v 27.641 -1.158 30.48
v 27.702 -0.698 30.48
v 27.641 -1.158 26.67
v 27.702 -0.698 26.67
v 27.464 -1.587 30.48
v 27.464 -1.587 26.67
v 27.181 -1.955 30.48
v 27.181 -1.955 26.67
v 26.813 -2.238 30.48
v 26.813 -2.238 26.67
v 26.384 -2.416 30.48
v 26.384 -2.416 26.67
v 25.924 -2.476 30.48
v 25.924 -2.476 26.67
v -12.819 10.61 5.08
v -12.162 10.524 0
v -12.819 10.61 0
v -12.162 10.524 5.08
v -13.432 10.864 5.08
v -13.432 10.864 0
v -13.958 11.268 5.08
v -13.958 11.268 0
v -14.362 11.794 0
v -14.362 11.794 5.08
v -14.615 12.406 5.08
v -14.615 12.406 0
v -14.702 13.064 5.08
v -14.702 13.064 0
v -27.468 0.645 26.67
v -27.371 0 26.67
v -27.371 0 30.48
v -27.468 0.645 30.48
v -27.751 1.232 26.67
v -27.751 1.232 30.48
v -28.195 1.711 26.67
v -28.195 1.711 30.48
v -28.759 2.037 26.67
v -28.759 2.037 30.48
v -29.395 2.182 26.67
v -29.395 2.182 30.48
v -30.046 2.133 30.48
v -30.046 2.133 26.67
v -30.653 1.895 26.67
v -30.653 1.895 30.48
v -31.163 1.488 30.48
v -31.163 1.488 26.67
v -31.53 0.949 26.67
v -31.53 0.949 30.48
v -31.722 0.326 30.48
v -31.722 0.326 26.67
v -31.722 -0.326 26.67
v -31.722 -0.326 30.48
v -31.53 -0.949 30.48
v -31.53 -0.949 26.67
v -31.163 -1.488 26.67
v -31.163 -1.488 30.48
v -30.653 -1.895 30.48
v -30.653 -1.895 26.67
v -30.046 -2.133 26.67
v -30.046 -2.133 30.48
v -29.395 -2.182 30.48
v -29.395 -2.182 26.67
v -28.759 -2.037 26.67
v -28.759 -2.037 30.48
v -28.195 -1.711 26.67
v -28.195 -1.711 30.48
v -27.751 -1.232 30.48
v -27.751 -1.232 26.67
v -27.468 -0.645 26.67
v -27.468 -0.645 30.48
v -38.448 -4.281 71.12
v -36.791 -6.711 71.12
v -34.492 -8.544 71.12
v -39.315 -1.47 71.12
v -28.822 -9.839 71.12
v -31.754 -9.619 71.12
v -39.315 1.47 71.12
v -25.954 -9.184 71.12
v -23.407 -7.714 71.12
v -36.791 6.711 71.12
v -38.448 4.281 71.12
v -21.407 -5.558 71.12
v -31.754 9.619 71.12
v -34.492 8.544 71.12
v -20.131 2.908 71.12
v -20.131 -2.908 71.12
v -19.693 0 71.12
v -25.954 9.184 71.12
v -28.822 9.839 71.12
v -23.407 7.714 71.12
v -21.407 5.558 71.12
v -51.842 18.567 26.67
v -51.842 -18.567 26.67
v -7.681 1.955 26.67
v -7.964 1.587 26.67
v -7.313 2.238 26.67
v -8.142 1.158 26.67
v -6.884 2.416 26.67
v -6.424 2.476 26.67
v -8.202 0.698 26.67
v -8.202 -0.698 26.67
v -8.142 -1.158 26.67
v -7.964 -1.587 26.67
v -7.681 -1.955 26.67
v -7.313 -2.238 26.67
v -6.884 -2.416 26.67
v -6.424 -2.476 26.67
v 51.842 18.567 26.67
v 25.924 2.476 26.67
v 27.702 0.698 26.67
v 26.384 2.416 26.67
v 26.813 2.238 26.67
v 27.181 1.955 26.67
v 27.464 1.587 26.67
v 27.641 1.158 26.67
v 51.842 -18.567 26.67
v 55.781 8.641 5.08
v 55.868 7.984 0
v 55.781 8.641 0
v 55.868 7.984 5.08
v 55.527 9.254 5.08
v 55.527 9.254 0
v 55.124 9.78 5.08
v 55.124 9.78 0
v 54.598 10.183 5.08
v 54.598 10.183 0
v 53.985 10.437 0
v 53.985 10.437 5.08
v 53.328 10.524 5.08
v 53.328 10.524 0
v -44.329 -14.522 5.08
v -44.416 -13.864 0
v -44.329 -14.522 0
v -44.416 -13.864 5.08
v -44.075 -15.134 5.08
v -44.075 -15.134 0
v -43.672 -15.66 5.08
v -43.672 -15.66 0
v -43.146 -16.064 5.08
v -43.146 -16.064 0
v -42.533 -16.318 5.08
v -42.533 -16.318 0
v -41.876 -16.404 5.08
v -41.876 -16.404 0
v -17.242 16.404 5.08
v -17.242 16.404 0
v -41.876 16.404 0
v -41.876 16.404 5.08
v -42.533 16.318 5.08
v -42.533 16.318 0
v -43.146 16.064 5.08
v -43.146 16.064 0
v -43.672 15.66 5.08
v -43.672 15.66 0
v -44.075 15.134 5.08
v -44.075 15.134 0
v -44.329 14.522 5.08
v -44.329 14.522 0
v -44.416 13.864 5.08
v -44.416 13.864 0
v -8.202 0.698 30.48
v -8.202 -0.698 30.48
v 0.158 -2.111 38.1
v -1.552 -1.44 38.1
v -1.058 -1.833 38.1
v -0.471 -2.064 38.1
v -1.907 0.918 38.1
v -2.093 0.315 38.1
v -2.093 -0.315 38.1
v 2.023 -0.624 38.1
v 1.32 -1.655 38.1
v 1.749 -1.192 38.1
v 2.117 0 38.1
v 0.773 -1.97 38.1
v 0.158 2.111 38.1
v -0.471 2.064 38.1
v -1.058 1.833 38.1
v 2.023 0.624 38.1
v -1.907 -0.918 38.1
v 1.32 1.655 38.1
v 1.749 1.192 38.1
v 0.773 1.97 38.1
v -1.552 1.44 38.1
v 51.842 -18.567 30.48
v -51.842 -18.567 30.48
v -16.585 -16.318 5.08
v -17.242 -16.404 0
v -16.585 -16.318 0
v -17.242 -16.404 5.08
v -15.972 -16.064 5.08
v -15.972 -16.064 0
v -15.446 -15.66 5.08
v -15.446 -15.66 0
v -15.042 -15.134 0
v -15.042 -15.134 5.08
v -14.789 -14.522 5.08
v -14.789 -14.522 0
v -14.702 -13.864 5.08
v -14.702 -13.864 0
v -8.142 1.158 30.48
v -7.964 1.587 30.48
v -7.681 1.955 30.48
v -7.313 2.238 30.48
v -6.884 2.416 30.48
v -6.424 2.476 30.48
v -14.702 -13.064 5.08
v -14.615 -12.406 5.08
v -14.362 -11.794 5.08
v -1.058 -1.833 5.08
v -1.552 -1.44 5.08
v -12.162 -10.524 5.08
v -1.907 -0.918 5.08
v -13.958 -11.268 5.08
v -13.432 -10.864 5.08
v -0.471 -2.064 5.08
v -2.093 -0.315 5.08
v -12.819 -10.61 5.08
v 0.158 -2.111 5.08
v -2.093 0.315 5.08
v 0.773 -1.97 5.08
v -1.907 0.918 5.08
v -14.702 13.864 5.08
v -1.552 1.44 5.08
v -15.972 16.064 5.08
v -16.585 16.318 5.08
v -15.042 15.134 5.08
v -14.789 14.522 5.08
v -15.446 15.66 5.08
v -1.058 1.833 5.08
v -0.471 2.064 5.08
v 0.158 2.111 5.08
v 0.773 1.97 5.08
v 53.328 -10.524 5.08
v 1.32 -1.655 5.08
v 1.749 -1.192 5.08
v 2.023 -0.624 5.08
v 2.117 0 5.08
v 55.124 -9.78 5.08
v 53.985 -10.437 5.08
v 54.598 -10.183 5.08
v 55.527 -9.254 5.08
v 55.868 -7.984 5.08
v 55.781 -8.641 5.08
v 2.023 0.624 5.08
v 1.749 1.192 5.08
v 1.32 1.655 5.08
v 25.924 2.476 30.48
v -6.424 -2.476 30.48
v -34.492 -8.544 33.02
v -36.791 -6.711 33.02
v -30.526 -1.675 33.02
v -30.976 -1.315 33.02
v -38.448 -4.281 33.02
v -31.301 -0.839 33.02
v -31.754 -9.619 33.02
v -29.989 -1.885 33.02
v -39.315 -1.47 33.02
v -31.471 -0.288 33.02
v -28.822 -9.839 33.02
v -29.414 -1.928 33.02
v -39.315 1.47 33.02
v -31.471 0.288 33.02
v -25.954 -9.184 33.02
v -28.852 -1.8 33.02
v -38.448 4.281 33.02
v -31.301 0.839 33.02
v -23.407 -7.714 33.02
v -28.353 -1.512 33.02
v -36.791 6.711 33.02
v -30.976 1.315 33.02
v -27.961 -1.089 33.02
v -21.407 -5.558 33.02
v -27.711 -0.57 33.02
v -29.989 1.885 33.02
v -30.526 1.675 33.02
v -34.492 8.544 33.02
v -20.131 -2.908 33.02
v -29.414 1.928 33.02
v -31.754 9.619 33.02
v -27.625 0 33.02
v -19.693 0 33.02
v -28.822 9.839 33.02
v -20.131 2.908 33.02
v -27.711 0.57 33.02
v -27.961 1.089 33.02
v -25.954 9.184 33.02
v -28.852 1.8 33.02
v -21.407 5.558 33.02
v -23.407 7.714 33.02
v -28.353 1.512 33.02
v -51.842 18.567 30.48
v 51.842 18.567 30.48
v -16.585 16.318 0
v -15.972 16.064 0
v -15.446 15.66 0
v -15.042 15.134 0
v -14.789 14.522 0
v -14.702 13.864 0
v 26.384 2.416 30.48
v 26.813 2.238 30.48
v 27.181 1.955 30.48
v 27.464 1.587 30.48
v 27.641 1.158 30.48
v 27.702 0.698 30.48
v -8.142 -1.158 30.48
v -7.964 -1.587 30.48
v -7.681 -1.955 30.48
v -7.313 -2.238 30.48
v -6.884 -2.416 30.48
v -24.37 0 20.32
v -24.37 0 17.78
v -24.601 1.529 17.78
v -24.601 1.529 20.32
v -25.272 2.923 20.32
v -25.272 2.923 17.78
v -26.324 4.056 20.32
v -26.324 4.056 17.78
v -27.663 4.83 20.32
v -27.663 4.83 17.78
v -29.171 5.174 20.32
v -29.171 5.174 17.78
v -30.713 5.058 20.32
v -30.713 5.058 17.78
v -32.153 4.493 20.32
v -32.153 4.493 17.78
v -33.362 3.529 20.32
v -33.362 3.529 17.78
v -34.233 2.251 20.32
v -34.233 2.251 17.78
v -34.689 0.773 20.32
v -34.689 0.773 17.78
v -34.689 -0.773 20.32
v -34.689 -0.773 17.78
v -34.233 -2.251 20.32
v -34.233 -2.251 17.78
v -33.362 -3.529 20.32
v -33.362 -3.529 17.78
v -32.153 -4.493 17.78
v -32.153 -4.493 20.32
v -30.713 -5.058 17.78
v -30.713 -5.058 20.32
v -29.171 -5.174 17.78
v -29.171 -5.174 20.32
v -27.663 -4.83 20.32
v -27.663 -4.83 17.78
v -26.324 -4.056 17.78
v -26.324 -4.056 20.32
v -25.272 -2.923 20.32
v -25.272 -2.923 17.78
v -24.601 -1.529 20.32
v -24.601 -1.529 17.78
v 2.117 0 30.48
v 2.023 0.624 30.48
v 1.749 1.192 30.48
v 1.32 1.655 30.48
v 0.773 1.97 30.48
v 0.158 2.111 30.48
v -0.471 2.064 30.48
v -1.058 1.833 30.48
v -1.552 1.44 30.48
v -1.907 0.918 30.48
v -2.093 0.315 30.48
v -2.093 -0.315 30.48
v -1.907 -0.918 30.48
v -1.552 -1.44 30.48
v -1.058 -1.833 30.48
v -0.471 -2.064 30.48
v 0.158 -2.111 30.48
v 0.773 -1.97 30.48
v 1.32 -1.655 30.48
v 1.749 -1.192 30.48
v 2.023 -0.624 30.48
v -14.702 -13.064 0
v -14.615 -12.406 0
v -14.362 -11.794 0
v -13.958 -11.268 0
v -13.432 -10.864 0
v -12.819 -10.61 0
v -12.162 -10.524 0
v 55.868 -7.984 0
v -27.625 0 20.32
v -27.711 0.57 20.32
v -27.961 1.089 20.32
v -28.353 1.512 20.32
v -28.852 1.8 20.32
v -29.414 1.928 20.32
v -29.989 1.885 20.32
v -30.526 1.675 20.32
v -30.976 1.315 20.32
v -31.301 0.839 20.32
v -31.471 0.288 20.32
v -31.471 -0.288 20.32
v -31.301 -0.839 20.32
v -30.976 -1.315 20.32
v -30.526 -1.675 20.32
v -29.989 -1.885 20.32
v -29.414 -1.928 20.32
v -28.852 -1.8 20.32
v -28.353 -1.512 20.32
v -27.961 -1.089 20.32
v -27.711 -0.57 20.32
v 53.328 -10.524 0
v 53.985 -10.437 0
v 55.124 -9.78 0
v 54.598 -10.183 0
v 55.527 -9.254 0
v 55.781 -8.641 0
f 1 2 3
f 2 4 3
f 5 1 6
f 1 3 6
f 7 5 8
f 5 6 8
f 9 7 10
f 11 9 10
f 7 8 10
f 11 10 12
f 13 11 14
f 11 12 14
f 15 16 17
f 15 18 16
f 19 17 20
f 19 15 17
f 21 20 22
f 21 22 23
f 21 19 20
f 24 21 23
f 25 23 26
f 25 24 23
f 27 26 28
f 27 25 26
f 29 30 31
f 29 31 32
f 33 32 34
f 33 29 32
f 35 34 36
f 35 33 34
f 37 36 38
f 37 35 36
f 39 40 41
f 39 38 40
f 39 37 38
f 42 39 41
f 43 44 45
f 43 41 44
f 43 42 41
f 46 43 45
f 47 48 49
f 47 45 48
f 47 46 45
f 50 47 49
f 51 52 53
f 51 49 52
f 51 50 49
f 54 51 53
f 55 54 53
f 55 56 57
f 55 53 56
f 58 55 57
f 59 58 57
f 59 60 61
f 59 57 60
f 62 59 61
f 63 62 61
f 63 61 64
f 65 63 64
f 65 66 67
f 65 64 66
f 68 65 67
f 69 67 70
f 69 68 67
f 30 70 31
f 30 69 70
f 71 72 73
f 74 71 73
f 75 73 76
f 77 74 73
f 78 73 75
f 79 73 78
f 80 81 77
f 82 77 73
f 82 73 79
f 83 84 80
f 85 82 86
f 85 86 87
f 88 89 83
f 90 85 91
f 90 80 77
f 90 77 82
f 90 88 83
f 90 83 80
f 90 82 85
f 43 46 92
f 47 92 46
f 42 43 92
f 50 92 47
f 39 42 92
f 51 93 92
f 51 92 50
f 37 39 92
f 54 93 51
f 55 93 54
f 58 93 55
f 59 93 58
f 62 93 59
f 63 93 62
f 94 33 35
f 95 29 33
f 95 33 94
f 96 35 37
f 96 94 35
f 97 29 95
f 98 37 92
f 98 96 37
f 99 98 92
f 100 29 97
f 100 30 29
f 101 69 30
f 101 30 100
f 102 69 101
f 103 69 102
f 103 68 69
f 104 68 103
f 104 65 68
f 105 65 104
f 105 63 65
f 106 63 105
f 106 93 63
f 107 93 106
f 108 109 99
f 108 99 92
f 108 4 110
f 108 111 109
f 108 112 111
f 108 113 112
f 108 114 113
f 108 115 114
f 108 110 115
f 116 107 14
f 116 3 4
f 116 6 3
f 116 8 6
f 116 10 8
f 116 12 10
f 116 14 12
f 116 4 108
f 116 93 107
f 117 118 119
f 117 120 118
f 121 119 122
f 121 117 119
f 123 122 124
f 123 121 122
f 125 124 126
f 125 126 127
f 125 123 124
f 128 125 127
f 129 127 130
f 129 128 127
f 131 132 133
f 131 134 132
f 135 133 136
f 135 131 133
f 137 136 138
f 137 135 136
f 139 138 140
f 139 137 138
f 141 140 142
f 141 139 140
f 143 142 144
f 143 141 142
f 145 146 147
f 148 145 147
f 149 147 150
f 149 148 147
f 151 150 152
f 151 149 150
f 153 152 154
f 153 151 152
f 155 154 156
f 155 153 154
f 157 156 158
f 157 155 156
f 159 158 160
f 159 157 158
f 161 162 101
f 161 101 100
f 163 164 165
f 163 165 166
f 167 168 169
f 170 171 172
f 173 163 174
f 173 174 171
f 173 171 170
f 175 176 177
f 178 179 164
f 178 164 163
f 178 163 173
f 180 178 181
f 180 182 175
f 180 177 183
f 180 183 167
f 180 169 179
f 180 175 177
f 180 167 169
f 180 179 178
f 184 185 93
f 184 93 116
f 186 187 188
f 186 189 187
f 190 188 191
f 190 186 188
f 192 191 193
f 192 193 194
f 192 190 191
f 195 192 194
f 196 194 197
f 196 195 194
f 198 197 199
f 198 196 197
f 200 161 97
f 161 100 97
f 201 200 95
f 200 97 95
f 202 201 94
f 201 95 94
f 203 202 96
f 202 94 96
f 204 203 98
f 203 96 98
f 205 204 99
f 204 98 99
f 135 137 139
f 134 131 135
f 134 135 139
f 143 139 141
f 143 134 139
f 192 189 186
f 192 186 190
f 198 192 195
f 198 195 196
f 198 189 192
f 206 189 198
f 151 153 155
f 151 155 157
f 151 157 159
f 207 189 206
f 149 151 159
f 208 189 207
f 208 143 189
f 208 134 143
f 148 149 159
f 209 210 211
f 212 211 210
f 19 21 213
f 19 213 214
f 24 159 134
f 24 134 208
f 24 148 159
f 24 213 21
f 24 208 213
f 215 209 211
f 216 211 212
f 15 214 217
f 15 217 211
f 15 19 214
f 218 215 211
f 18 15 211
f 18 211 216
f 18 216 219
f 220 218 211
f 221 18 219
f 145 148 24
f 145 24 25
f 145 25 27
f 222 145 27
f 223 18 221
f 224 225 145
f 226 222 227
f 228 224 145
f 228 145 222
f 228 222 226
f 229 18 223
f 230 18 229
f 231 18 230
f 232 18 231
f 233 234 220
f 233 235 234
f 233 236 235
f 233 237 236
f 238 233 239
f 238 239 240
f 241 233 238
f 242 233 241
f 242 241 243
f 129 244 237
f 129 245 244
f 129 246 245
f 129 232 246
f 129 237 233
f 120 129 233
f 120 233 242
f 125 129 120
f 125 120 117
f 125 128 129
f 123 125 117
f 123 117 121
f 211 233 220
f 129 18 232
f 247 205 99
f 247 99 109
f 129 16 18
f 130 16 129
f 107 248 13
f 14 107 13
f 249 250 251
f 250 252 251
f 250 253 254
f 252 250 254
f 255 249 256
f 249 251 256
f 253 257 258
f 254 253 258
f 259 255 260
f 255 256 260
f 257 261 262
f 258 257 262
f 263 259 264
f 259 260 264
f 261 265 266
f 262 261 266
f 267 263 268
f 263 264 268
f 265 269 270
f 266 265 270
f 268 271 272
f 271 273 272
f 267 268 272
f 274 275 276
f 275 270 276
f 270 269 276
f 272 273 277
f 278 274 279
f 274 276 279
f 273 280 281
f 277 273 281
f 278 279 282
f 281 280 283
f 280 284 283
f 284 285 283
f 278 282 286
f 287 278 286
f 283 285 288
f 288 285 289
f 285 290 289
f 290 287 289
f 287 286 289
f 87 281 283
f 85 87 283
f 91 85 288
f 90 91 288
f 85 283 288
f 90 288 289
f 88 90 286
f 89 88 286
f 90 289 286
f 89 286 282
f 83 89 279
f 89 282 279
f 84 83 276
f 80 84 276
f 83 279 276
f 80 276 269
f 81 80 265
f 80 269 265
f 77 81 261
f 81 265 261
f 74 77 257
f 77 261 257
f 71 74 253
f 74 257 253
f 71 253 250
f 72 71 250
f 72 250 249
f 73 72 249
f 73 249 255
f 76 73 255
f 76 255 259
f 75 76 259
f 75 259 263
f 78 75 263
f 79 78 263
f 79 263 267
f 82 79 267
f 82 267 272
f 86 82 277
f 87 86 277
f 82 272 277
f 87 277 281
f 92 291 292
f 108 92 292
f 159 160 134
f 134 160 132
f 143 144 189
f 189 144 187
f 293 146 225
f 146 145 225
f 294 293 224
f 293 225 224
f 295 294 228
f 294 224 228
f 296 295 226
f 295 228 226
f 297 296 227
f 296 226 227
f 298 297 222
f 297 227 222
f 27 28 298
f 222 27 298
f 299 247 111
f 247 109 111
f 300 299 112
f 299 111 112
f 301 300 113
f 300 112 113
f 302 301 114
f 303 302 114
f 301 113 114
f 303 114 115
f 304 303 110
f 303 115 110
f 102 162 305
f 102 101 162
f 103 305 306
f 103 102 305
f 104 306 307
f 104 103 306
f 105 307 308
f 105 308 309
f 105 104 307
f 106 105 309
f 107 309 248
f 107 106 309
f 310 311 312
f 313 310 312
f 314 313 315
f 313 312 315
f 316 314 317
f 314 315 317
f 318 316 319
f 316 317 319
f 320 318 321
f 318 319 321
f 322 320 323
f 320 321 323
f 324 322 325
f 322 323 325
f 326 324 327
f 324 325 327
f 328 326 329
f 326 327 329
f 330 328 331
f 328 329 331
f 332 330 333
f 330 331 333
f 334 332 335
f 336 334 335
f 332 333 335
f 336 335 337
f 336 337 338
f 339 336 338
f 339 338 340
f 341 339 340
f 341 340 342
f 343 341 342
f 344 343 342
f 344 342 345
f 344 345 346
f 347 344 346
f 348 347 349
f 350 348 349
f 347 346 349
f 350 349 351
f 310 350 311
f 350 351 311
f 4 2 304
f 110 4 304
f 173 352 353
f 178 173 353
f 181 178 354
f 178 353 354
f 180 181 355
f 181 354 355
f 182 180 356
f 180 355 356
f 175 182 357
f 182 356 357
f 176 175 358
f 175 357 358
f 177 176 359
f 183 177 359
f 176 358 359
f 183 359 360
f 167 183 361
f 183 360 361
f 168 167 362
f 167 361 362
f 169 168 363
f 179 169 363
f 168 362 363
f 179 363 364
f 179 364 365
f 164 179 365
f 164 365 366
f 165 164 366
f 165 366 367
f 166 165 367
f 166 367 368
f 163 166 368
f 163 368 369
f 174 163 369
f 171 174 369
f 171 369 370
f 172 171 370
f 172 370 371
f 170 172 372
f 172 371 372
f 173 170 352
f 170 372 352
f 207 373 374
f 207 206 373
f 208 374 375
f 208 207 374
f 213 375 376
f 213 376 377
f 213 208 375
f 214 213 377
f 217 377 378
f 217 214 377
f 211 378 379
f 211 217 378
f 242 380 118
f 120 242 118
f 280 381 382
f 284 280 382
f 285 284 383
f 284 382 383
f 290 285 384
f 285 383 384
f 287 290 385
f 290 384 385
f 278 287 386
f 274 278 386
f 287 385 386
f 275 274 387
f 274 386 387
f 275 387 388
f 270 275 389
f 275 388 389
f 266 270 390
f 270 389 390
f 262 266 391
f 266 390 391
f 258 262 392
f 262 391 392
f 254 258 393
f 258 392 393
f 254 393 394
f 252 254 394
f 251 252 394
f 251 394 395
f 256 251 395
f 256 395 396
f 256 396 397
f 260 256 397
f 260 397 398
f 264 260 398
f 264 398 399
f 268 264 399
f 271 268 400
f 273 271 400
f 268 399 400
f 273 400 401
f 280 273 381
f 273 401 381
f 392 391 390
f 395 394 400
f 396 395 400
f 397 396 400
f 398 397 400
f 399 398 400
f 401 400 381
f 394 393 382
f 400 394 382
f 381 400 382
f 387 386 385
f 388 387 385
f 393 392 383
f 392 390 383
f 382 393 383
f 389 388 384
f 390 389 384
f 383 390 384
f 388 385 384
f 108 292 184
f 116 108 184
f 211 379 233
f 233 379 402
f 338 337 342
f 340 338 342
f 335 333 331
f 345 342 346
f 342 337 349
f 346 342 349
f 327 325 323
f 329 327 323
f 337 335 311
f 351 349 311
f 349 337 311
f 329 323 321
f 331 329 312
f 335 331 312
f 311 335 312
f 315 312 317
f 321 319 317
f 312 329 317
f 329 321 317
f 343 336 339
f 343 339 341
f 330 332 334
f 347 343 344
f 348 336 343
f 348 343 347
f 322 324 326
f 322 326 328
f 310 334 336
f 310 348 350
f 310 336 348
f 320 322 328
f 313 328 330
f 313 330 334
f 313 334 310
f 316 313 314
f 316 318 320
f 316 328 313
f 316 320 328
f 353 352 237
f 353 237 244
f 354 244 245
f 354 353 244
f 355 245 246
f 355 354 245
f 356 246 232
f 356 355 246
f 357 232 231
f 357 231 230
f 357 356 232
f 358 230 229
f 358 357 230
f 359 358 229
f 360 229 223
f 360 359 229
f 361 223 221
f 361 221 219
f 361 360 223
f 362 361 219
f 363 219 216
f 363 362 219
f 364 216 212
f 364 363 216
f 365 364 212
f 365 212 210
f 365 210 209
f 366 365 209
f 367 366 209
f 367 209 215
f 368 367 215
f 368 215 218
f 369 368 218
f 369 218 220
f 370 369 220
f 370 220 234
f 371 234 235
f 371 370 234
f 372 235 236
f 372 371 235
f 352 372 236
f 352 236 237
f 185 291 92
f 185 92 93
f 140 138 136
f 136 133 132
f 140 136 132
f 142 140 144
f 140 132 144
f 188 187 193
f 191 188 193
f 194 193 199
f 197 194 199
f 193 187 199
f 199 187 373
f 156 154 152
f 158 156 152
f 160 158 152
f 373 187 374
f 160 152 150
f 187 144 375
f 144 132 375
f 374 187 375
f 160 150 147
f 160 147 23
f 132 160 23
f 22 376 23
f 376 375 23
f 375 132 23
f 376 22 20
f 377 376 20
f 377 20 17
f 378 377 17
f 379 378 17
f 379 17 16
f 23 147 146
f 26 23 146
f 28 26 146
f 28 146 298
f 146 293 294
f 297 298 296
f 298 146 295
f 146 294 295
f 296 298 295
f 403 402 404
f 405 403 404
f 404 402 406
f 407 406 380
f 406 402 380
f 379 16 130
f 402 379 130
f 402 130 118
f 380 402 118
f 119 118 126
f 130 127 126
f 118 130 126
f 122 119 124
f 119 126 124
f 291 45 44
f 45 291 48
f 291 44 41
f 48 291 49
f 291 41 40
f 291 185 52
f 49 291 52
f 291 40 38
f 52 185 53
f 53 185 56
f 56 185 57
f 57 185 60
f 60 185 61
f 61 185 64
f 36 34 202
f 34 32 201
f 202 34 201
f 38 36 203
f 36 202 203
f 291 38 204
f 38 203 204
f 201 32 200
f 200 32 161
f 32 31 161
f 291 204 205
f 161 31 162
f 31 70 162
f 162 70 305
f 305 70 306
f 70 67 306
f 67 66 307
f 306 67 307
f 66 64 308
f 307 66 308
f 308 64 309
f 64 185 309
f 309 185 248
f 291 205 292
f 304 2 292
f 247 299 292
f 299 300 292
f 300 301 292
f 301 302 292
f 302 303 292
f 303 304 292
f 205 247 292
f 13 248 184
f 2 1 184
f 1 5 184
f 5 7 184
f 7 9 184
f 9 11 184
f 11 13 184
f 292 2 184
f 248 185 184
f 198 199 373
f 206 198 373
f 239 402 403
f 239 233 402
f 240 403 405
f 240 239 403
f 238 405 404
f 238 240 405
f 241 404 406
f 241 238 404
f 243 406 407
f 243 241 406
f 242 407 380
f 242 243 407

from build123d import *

# Parameters (mm, degrees)
F0_W       = 70.5697461963
F0_H       = 21.0471190512
F1_DEPTH   = 5.08
F2_R       = 2.54
F4_R       = 5.1884405509
F5_DEPTH   = 2.54
F6_R       = 1.9338794711
F7_DEPTH   = 12.7
F8_R       = 9.866190216
F8_R_2     = 1.9338794711
F9_DEPTH   = 38.1
F11_W      = 103.6831215024
F11_H      = 37.1339991689
F12_DEPTH  = 3.81
F13_OFFSET = 0.254
F14_W      = 35.903910175
F14_H      = 4.952263087
F15_DEPTH  = 30.481
F16_R      = 1.778
F17_R      = 2.116683431
F18_DEPTH  = 25.4
F19_DEPTH  = 7.62


with BuildPart() as f1:
    # F0 (on Top) → F1 (new body)
    with BuildSketch(Plane.XY):
        Polygon((-14.7020295262, 16.4043717086), (-44.4156117737, 16.4043717086), (-44.4156117737, -16.4043717086), (-14.7020295262, -16.4043717086), (-14.7020295262, -10.5235595256), (-14.7020295262, 10.5235595256), align=None)
        with Locations((20.5828435719, 0)):
            Rectangle(F0_W, F0_H)
    extrude(amount=F1_DEPTH)

    # F2
    f2_edges = [f1.edges().sort_by_distance(p)[0] for p in [
        (-14.70203, 10.52356, 2.54),
        (-14.70203, 16.404372, 2.54),
        (-44.415612, 16.404372, 2.54),
        (55.867717, 10.52356, 2.54),
        (55.867717, -10.52356, 2.54),
        (-14.70203, -10.52356, 2.54),
        (-14.70203, -16.404372, 2.54),
        (-44.415612, -16.404372, 2.54),
    ]]
    fillet(f2_edges, radius=F2_R)

    # F17 (on face) → F18 (join, through all)
    with BuildSketch(Plane.XY.offset(30.48)):
        Circle(F17_R)
    extrude(amount=-F18_DEPTH)

    # F19 (add): a face of the model
    f19_faces = [f1.faces().sort_by_distance(p)[0] for p in [
        (0, 0, 30.48),
    ]]
    extrude(f19_faces, amount=F19_DEPTH)


with BuildPart() as f5:
    # F4 (on offset) → F5 (new body)
    with BuildSketch(Plane.XY.offset(17.78)):
        with Locations((-29.55882065, 0)):
            Circle(F4_R)
    extrude(amount=F5_DEPTH)


with BuildPart() as f7:
    # F6 (on face) → F7 (new body)
    with BuildSketch(Plane.XY.offset(20.32)):
        with Locations((-29.55882065, 0)):
            Circle(F6_R)
    extrude(amount=F7_DEPTH)

    # F8 (on face) → F9 (join)
    with BuildSketch(Plane.XY.offset(33.02)):
        with Locations((-29.55882065, 0)):
            Circle(F8_R)
        with Locations((-29.55882065, 0)):
            Circle(F8_R_2, mode=Mode.SUBTRACT)
        with Locations((-29.55882065, 0)):
            Circle(F8_R_2)
    extrude(amount=F9_DEPTH)


with BuildPart() as f12:
    # F11 (on offset) → F12 (new body)
    with BuildSketch(Plane(origin=(0, 0, 30.48), x_dir=(1, 0, 0), z_dir=(0, 0, -1))):
        Rectangle(F11_W, F11_H)
    extrude(amount=F12_DEPTH)

    # F13: cut F7, made larger all round first
    f13_tool = offset(f7.part, amount=F13_OFFSET, kind=Kind.INTERSECTION, mode=Mode.PRIVATE)
    add(f13_tool, mode=Mode.SUBTRACT)

    # F14 (on face) → F15 (cut, through all)
    with BuildSketch(Plane.XY.offset(30.48)):
        with Locations((9.7497692332, 0)):
            Rectangle(F14_W, F14_H)
    extrude(amount=-F15_DEPTH, mode=Mode.SUBTRACT)

    # F16
    f16_edges = [f12.edges().sort_by_distance(p)[0] for p in [
        (-8.202186, 2.476132, 28.575),
        (-8.202186, -2.476132, 28.575),
        (27.701724, 2.476132, 28.575),
        (27.701724, -2.476132, 28.575),
    ]]
    fillet(f16_edges, radius=F16_R)


solid = Compound([f1.part, f5.part, f7.part, f12.part])
